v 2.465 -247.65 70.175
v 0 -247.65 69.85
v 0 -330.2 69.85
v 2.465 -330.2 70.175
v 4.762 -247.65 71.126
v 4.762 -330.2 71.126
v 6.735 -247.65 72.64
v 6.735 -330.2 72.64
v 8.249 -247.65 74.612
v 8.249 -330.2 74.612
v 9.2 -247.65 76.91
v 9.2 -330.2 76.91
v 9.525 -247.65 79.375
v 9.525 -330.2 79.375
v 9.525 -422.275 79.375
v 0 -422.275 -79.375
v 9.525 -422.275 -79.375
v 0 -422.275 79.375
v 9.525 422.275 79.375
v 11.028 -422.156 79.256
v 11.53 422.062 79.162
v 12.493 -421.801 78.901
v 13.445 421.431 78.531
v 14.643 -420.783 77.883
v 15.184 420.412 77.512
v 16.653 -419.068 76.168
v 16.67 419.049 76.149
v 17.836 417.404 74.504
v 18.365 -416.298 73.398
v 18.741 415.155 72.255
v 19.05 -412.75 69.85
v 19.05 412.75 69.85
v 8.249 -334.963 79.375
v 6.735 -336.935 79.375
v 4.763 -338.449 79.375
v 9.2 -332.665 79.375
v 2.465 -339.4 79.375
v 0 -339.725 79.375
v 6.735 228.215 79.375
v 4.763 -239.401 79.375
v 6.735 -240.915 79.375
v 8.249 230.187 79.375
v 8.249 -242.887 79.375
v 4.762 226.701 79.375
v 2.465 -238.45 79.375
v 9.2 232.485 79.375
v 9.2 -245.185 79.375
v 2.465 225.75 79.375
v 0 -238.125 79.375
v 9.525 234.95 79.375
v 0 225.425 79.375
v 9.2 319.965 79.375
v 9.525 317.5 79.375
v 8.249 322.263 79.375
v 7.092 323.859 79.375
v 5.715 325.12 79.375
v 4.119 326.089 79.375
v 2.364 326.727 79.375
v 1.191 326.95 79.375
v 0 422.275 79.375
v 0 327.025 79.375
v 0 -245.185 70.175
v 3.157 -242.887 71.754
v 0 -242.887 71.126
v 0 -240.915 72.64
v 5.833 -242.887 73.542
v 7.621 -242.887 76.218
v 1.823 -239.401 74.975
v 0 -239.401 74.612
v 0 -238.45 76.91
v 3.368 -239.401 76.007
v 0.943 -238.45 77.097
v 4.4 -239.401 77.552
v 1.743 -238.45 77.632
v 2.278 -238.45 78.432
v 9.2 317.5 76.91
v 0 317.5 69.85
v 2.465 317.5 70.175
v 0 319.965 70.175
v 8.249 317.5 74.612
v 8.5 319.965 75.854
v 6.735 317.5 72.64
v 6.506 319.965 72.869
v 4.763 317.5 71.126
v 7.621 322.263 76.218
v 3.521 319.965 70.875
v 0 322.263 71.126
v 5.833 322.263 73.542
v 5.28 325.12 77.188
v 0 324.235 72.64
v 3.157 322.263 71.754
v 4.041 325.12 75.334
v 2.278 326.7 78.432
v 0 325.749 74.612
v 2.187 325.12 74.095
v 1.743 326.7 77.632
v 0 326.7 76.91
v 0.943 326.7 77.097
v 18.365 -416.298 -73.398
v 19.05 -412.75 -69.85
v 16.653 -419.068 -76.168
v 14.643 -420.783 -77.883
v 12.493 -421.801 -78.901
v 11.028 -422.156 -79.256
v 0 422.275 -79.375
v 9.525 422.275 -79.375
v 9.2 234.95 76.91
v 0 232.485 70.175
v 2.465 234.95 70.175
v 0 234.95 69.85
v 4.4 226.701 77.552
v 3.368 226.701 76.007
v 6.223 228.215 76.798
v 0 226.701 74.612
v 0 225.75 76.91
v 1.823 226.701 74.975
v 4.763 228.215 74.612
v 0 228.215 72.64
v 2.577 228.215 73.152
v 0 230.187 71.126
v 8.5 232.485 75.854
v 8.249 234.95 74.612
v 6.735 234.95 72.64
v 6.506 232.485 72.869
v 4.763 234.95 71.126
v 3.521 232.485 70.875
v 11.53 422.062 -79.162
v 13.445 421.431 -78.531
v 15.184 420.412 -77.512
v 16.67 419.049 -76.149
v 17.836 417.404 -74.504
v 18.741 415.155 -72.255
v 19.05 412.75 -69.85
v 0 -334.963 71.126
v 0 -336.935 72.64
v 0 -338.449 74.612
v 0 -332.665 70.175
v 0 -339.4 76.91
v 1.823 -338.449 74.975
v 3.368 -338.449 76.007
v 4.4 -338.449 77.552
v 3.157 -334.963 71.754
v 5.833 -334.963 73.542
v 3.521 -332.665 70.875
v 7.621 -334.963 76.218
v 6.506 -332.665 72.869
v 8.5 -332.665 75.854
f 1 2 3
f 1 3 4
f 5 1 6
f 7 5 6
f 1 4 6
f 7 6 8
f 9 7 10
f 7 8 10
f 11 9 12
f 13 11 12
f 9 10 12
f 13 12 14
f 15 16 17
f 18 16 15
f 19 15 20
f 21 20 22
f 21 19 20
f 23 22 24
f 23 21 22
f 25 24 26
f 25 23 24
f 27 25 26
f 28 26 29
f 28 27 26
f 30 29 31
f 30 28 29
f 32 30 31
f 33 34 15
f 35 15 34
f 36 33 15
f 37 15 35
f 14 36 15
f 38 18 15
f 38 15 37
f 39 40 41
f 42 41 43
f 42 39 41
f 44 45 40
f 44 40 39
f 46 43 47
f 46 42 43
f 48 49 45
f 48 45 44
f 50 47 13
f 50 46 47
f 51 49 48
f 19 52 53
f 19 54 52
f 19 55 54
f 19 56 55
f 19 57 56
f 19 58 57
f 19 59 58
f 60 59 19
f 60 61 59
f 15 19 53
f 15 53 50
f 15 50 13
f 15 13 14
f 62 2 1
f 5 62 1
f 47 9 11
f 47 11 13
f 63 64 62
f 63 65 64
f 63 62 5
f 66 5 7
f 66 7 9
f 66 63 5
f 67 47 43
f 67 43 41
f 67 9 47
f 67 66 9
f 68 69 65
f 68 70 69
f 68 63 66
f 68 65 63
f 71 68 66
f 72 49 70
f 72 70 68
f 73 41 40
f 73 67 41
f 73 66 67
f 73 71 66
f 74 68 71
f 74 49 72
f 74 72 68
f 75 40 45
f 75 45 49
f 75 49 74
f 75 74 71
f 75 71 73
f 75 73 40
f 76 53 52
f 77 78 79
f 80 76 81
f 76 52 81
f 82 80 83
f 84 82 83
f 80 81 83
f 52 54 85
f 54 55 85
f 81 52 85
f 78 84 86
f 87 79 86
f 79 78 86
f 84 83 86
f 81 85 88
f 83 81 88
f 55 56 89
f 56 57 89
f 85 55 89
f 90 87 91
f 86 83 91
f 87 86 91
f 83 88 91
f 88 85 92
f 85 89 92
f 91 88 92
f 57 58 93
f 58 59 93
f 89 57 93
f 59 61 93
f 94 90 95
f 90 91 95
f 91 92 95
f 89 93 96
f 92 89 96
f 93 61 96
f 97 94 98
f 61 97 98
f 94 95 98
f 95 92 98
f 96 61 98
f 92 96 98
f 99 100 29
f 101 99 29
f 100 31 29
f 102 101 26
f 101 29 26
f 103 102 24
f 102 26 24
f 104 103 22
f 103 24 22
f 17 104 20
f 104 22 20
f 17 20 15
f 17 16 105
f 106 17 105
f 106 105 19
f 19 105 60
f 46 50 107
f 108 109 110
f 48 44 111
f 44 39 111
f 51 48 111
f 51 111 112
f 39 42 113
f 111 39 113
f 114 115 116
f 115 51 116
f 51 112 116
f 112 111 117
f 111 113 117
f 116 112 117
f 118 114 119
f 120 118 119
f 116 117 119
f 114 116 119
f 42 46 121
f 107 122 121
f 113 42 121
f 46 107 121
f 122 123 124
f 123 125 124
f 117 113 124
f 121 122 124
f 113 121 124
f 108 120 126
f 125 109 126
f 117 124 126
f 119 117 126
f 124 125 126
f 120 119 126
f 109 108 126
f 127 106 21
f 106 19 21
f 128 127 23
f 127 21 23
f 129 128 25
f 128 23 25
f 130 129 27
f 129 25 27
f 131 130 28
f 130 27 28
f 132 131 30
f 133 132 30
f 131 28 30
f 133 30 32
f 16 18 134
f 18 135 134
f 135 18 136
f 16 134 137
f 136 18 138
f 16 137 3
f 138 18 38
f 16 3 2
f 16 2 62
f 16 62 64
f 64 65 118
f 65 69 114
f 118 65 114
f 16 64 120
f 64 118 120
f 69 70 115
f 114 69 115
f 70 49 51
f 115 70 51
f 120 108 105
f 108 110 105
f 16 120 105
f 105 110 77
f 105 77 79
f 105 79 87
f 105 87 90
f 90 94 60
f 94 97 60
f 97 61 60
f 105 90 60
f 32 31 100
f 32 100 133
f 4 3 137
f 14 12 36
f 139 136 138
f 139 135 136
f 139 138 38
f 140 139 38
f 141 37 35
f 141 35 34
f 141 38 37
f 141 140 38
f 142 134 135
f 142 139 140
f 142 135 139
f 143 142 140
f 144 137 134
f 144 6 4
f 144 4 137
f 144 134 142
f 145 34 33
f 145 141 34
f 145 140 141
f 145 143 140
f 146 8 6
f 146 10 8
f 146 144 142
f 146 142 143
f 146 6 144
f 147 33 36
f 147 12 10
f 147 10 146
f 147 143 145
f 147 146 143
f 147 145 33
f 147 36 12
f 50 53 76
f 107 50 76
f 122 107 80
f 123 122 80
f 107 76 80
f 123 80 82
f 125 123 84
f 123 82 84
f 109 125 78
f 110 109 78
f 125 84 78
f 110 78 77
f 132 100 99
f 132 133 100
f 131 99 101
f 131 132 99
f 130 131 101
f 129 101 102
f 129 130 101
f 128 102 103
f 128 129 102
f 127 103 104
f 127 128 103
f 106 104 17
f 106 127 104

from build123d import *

# Parameters (mm, degrees)
F0_W     = 844.55
F0_H     = 158.75
F1_DEPTH = 19.05
F3_R     = 9.525
F4_DEPTH = 101.6
F5_R     = 9.52499
F7_R     = 9.525
F8_DEPTH = 101.6
F9_R     = 9.52499
F10_R    = 9.52499


# Not quite as in the source:
# - a fillet or chamfer is up to 0.001 mm smaller than in the source, because OpenCascade refuses the exact size


with BuildPart() as f1:
    # F0 (on Right) → F1 (new body)
    with BuildSketch(Plane.YZ):
        Rectangle(F0_W, F0_H)
    extrude(amount=F1_DEPTH)

    # F3 (on offset) → F4 (cut)
    with BuildSketch(Plane.XZ.offset(339.725)):
        with Locations((0, 79.375)):
            Circle(F3_R)
    extrude(amount=-F4_DEPTH, mode=Mode.SUBTRACT)

    # F5 (radius 9.525 in the source; OpenCascade refuses exactly that, so slightly less here)
    f5_edges = [f1.edges().sort_by_distance(p)[0] for p in [
        (6.735192, -339.725, 72.639808),
        (6.735192, -238.125, 72.639808),
    ]]
    fillet(f5_edges, radius=F5_R)

    # F7 (on offset) → F8 (cut)
    with BuildSketch(Plane(origin=(0, 327.025, 0), x_dir=(-1, 0, 0), z_dir=(0, 1, 0))):
        with Locations((0, 79.375)):
            Circle(F7_R)
    extrude(amount=-F8_DEPTH, mode=Mode.SUBTRACT)

    # F9 (radius 9.525 in the source; OpenCascade refuses exactly that, so slightly less here)
    f9_edges = [f1.edges().sort_by_distance(p)[0] for p in [
        (6.735192, 225.425, 72.639808),
        (6.735192, 327.025, 72.639808),
    ]]
    fillet(f9_edges, radius=F9_R)

    # F10 (radius 9.525 in the source; OpenCascade refuses exactly that, so slightly less here)
    f10_edges = [f1.edges().sort_by_distance(p)[0] for p in [
        (19.05, -422.275, 0),
        (19.05, 0, 79.375),
        (19.05, 422.275, 0),
        (19.05, 0, -79.375),
    ]]
    fillet(f10_edges, radius=F10_R)


solid = f1.part
